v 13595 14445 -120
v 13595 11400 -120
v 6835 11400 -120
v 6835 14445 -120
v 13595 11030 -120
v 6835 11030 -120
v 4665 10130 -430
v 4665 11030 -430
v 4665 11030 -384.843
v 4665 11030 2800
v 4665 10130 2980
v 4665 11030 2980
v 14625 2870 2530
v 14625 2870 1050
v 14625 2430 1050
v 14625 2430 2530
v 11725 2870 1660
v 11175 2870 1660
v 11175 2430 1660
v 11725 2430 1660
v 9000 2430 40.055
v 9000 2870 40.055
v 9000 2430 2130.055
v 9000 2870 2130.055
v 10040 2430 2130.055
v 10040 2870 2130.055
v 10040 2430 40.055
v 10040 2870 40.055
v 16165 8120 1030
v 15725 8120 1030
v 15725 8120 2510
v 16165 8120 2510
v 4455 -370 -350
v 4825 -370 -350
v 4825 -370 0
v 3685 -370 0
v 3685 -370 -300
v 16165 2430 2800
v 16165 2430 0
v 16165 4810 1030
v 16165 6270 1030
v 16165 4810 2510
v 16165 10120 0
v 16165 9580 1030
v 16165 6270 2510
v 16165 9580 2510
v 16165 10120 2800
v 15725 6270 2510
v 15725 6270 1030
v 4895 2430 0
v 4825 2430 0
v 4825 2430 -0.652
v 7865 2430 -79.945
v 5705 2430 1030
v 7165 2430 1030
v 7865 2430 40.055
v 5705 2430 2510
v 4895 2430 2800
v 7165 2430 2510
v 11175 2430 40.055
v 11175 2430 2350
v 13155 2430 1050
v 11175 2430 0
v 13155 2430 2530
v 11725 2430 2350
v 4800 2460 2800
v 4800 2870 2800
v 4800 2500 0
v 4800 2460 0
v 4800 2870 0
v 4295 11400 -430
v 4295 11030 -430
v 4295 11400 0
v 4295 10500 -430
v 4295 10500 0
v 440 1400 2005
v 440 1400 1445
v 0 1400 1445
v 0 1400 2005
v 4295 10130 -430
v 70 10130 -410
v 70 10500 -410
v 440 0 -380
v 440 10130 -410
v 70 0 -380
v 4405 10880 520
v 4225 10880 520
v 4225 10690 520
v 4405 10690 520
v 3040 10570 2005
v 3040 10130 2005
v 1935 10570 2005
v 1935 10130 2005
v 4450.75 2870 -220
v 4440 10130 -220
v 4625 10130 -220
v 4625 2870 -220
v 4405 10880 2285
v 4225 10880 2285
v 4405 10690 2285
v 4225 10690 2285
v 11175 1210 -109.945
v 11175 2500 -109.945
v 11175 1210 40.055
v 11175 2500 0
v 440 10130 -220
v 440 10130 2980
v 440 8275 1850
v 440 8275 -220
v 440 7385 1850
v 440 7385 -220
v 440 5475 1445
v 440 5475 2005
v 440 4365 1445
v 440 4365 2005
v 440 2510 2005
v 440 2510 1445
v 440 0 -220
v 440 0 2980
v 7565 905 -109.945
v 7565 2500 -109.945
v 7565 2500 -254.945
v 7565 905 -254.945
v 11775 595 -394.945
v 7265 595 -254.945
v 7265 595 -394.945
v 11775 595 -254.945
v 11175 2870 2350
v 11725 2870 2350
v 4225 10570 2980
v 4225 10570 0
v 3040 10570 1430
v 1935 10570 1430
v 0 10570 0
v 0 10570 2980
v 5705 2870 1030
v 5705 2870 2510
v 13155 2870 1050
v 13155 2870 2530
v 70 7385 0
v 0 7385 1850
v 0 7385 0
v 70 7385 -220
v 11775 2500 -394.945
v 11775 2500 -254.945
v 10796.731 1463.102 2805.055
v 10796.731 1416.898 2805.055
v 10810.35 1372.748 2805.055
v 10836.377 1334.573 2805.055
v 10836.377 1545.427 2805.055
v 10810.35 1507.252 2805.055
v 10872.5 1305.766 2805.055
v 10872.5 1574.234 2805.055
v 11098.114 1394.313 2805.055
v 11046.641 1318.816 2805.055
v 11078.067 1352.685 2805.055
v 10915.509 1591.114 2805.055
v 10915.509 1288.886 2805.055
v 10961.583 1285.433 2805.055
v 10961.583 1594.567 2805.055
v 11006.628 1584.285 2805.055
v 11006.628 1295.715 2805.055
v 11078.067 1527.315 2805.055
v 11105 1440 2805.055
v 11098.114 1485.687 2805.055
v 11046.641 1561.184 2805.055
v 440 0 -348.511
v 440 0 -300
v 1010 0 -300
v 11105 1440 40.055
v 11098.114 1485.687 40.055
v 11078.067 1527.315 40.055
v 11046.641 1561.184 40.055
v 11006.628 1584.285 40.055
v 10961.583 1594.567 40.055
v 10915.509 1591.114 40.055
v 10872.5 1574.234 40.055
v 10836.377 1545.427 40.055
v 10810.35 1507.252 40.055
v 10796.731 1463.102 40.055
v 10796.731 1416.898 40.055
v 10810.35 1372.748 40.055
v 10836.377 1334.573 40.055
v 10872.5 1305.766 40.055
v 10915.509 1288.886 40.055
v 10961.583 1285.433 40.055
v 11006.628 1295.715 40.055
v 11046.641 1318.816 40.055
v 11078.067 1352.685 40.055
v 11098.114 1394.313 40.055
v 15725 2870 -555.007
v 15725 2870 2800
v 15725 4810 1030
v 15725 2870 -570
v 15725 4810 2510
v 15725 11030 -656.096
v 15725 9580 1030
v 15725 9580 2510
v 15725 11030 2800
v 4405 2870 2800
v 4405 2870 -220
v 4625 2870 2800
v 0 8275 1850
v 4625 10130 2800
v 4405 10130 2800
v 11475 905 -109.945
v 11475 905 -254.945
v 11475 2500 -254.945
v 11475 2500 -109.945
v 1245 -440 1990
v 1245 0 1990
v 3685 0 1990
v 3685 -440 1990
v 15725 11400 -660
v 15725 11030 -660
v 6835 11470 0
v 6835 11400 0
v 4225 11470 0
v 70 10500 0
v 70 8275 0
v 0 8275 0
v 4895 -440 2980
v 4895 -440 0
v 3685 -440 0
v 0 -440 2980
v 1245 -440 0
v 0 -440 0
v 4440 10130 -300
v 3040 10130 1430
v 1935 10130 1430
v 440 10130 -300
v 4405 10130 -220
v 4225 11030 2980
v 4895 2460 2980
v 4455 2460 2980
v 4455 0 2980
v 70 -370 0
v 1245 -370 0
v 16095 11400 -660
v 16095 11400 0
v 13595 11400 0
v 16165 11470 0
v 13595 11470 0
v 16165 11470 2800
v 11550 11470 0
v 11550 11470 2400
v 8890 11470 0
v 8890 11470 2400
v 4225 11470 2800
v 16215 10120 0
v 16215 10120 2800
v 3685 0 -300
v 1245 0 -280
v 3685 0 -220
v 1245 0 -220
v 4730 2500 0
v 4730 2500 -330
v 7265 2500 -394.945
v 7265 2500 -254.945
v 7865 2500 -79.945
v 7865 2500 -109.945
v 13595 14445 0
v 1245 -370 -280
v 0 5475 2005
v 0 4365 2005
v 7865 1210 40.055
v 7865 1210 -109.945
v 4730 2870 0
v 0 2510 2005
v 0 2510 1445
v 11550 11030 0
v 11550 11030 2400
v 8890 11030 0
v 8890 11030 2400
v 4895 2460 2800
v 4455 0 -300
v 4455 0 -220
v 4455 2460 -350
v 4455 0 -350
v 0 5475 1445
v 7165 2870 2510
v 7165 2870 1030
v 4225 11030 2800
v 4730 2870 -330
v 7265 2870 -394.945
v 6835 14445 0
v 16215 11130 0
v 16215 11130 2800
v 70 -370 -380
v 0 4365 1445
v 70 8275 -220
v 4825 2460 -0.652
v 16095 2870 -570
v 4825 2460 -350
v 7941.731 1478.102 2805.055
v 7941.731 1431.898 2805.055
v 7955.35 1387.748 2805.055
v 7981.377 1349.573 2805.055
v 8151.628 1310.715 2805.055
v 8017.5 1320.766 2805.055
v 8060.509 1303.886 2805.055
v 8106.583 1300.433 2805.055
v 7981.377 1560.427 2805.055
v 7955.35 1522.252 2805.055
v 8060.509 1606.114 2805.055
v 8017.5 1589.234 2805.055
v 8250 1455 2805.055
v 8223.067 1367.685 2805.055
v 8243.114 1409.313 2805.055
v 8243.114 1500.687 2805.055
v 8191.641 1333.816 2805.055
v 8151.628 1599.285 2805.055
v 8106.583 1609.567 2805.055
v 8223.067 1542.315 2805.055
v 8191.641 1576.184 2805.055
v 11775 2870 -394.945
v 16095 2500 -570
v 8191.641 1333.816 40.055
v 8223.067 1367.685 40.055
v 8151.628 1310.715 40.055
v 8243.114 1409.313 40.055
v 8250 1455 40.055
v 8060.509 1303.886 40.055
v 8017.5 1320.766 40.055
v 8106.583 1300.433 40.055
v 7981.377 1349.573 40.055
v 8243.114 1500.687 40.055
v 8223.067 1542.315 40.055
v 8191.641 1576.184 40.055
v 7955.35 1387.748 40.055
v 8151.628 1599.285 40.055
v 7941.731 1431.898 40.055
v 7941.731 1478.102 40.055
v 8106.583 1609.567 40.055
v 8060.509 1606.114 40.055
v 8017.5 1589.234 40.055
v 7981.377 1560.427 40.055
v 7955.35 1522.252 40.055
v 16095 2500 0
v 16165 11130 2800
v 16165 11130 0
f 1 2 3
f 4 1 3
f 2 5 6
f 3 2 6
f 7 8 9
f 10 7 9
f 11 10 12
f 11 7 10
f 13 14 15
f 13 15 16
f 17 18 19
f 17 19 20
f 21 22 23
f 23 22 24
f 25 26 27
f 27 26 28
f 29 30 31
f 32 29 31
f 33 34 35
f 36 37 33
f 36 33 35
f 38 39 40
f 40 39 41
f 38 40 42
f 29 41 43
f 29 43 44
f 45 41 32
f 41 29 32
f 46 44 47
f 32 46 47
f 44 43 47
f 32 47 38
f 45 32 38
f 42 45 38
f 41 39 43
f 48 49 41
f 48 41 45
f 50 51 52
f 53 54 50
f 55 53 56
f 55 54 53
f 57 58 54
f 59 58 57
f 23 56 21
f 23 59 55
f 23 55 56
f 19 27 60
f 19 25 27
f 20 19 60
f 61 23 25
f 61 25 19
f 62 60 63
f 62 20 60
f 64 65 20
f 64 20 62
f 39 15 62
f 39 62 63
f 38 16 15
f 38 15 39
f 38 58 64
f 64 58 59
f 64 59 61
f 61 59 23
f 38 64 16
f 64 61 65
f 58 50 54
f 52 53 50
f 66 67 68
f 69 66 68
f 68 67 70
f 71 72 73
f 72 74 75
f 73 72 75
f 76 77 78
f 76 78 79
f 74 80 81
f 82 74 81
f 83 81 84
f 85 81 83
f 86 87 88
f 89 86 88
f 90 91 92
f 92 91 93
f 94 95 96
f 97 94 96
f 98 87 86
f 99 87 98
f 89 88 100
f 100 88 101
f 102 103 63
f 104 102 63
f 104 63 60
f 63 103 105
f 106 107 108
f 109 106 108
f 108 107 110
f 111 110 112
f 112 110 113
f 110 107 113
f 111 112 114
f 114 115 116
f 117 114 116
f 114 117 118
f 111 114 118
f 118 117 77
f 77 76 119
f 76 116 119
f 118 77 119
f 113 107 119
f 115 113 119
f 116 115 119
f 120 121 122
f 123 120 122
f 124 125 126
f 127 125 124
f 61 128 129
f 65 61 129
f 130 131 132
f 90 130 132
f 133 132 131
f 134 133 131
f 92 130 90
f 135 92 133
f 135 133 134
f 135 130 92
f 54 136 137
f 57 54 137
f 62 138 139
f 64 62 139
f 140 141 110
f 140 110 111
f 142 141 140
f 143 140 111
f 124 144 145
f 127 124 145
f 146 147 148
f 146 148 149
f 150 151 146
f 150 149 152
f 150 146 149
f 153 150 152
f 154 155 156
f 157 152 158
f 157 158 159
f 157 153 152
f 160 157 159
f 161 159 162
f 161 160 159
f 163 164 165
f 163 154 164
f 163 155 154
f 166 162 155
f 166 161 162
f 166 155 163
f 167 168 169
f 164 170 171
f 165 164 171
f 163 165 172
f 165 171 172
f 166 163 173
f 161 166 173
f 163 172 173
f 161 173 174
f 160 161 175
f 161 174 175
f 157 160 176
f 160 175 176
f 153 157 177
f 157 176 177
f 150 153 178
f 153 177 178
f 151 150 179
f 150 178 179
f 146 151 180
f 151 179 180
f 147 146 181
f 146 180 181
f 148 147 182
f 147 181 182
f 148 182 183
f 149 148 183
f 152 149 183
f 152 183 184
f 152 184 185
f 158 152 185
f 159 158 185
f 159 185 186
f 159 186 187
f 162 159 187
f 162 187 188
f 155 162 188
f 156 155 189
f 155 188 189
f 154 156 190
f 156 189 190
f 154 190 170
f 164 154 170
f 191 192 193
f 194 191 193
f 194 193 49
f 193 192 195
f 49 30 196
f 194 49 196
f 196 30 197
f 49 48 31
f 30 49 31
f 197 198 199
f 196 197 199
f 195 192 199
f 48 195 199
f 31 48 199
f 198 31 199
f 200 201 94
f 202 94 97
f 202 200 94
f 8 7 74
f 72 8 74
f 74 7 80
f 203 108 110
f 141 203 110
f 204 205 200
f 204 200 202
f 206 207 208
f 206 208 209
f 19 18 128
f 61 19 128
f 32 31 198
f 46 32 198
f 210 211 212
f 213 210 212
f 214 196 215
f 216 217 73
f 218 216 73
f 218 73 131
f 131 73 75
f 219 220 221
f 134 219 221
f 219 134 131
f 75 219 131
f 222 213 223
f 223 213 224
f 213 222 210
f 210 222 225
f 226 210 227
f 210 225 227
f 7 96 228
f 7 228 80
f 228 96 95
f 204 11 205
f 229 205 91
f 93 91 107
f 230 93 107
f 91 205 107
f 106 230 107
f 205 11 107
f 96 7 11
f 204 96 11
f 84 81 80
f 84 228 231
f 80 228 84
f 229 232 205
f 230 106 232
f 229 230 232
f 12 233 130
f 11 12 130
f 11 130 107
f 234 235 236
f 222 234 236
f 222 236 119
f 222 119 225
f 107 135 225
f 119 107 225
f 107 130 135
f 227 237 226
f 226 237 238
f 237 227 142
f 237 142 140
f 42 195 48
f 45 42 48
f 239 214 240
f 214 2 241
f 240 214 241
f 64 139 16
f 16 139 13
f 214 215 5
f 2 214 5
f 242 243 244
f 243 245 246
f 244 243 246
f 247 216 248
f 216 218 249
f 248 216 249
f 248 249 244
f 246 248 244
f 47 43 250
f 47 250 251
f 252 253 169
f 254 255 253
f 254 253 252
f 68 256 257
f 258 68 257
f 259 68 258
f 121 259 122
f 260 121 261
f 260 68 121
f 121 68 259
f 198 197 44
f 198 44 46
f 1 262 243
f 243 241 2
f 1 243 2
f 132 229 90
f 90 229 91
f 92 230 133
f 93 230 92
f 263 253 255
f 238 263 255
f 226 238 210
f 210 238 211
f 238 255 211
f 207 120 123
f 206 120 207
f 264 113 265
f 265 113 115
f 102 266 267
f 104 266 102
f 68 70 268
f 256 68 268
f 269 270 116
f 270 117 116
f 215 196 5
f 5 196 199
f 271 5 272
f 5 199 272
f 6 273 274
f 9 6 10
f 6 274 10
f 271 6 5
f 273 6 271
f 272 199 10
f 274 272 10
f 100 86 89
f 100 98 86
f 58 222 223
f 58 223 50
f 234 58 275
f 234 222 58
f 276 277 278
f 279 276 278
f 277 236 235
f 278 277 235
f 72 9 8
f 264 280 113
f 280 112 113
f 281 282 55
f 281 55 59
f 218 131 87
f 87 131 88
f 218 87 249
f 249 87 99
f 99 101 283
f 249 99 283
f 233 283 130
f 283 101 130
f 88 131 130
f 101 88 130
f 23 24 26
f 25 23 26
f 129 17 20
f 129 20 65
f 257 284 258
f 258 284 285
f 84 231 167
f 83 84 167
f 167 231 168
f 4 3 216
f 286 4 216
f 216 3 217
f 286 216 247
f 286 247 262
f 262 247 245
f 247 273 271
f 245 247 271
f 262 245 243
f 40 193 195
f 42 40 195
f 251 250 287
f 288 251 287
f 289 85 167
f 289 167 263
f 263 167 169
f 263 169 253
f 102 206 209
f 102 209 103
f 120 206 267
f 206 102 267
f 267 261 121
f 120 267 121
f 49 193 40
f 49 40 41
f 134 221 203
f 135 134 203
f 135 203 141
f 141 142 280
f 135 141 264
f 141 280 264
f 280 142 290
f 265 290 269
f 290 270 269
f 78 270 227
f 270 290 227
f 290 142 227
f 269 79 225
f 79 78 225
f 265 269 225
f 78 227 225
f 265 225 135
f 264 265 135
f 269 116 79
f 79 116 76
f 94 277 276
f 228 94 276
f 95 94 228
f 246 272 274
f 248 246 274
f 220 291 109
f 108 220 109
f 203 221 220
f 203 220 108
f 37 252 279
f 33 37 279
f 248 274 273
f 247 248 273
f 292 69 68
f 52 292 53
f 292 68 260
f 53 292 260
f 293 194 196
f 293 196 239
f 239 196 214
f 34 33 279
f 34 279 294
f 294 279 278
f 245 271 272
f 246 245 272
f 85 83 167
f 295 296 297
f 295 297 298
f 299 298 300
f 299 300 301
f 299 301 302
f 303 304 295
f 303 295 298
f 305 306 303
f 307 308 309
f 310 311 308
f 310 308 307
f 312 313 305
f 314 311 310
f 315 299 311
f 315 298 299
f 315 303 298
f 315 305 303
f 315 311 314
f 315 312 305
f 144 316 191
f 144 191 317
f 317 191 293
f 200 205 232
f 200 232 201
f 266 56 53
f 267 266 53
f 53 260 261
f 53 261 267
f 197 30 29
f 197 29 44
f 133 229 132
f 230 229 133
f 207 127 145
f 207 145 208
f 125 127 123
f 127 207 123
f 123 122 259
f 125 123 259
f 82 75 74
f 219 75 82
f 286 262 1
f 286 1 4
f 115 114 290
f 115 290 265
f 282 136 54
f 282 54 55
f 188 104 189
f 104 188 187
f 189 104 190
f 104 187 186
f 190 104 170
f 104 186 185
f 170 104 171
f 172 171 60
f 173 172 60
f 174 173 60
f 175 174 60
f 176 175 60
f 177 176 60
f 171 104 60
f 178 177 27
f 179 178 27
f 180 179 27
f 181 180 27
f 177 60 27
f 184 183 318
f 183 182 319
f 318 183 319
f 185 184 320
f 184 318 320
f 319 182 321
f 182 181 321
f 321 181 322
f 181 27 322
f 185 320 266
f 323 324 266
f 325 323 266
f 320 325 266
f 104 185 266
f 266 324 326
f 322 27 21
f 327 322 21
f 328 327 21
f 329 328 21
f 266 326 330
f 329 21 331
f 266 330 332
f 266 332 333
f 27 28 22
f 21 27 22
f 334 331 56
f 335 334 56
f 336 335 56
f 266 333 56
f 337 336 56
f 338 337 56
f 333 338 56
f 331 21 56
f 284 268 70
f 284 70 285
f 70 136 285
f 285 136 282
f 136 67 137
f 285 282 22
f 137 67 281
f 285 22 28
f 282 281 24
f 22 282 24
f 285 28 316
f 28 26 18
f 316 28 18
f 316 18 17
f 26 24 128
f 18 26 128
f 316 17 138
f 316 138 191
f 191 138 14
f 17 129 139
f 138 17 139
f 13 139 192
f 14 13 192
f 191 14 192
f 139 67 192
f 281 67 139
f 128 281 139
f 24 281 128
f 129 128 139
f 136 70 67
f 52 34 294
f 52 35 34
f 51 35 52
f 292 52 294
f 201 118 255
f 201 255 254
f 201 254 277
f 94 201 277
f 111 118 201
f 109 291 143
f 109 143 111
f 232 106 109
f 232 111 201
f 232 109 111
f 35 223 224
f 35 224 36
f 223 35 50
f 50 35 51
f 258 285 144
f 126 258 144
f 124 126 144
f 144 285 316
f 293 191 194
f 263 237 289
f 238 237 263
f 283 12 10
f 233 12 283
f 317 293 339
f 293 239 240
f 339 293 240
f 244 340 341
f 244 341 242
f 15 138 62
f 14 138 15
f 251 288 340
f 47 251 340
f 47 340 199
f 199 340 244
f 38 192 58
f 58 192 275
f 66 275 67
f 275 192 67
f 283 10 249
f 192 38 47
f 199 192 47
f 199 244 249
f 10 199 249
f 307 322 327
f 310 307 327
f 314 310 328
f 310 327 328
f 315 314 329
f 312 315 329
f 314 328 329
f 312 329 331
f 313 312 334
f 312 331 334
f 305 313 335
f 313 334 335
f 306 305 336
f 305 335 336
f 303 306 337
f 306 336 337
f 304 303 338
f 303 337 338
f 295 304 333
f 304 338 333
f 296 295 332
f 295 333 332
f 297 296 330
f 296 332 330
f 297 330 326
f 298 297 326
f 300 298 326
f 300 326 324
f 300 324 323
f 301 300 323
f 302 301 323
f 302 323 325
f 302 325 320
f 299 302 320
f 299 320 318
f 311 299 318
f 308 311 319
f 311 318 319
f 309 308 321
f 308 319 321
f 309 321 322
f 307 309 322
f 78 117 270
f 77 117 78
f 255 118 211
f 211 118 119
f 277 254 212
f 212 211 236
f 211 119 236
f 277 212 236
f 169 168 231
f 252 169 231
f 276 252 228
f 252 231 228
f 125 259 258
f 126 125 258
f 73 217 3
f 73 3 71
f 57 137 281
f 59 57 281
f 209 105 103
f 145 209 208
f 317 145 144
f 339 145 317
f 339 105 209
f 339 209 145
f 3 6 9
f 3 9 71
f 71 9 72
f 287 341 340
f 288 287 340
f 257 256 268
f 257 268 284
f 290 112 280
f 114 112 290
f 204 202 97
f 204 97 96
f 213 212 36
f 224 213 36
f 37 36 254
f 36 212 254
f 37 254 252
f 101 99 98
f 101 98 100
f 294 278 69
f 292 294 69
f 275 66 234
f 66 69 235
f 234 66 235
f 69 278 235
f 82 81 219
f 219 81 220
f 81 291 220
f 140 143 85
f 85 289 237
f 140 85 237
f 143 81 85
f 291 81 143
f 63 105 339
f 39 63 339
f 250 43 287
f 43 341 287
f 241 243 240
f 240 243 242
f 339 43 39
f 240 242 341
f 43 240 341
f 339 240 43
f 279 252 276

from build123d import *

# Parameters (mm, degrees)
F1_DEPTH      = 440
F2_DEPTH      = 370
F3_W          = 1110
F3_H          = 560
F4_DEPTH      = 370
F4_DEPTH_BACK = 70
F5_DEPTH      = 370
F6_W          = 3785
F6_H          = 2980
F6_W_2        = 1105
F6_H_2        = 575
F7_DEPTH      = 440
F6_W_3        = 370
F6_H_3        = 410
F8_DEPTH      = 370
F9_DEPTH      = 900
F6_H_4        = 430
F10_DEPTH     = 900
F11_W         = 190
F11_H         = 1765
F12_DEPTH     = 400
F14_DEPTH     = 440
F15_DEPTH     = 370
F16_DEPTH     = 3415
F18_DEPTH     = 440
F17_W         = 7250
F17_H         = 2800
F17_W_2       = 1460
F17_H_2       = 1480
F17_W_3       = 910
F17_W_4       = 100
F19_DEPTH     = 490
F20_DEPTH     = 370
F21_W         = 1460
F21_H         = 1480
F21_W_2       = 1470
F21_W_3       = 550
F21_H_2       = 690
F22_DEPTH     = 440
F23_DEPTH     = 370
F24_DEPTH     = 2275
F25_DEPTH     = 1965
F26_DEPTH     = 1660
F27_R         = 155
F28_DEPTH     = 2765
F29_W         = 2460
F29_H         = 2980
F30_DEPTH     = 440
F29_H_2       = 350
F29_W_2       = 370
F31_DEPTH     = 370
F33_DEPTH     = 80
F34_W         = 220
F34_H         = 900
F34_H_2       = 7260
F35_DEPTH     = 3020


with BuildPart() as f1:
    # F0 (on Front) → F1 (new body)
    with BuildSketch(Plane.XZ):
        Polygon((0, 2980), (0, 0), (70, 0), (1245, 0), (1245, 1990), (3685, 1990), (3685, 0), (4455, 0), (4455, 2980), align=None)
    extrude(amount=F1_DEPTH)

    # F0 (on Front) → F2 (join)
    with BuildSketch(Plane.XZ):
        Polygon((1245, 0), (70, 0), (70, -380), (1245, -280), (1245, -180), align=None)
        Polygon((4455, -350), (4455, 0), (3685, 0), (3685, -180), (3685, -300), align=None)
    extrude(amount=F2_DEPTH)

    # F3 (on face) → F4 (join, two sides)
    with BuildSketch(Plane(origin=(70, 0, 0), x_dir=(0, -1, 0), z_dir=(-1, 0, 0))) as f4_sk:
        Polygon((440, 0), (440, 2980), (-10130, 2980), (-10130, 0), (-8275, 0), (-8275, 1850), (-7385, 1850), (-7385, 0), (0, 0), (370, 0), align=None)
        with Locations((-4920, 1725)):
            Rectangle(F3_W, F3_H, mode=Mode.SUBTRACT)
        with Locations((-1955, 1725)):
            Rectangle(F3_W, F3_H, mode=Mode.SUBTRACT)
    extrude(amount=-F4_DEPTH)
    extrude(f4_sk.sketch, amount=F4_DEPTH_BACK)

    # F3 (on face) → F5 (join)
    with BuildSketch(Plane(origin=(70, 0, 0), x_dir=(0, -1, 0), z_dir=(-1, 0, 0))):
        Polygon((-8275, 0), (-10130, 0), (-10130, -410), (0, -380), (0, 0), (-7385, 0), (-7385, -220), (-8275, -220), align=None)
    extrude(amount=-F5_DEPTH)

    # F6 (on face) → F7 (join)
    with BuildSketch(Plane(origin=(0, 10130, 0), x_dir=(-1, 0, 0), z_dir=(0, 1, 0))):
        Polygon((0, 0), (0, 2980), (-440, 2980), (-440, 0), (-70, 0), align=None)
        with Locations((-2332.5, 1490)):
            Rectangle(F6_W, F6_H)
        with Locations((-2487.5, 1717.5)):
            Rectangle(F6_W_2, F6_H_2, mode=Mode.SUBTRACT)
    extrude(amount=F7_DEPTH)

    # F6 (on face) → F8 (join)
    with BuildSketch(Plane(origin=(0, 10130, 0), x_dir=(-1, 0, 0), z_dir=(0, 1, 0))):
        Polygon((-440, -410), (-440, 0), (-4225, 0), (-4295, 0), (-4295, -430), (-70, -410), align=None)
        with Locations((-255, -205)):
            Rectangle(F6_W_3, F6_H_3)
    extrude(amount=F8_DEPTH)

    # F6 (on face) → F9 (join)
    with BuildSketch(Plane(origin=(0, 10130, 0), x_dir=(-1, 0, 0), z_dir=(0, 1, 0))):
        Polygon((-4225, 0), (-4225, 2980), (-4665, 2980), (-4665, 0), (-4295, 0), align=None)
    extrude(amount=F9_DEPTH)

    # F6 (on face) → F10 (join)
    with BuildSketch(Plane(origin=(0, 10130, 0), x_dir=(-1, 0, 0), z_dir=(0, 1, 0))):
        with Locations((-4480, -215)):
            Rectangle(F6_W_3, F6_H_4)
    extrude(amount=F10_DEPTH)

    # F11 (on face) → F12 (cut)
    with BuildSketch(Plane(origin=(4225, 0, 0), x_dir=(0, -1, 0), z_dir=(-1, 0, 0))):
        with Locations((-10785, 1402.5)):
            Rectangle(F11_W, F11_H)
    extrude(amount=-F12_DEPTH, mode=Mode.SUBTRACT)

    # F13 (on face) → F14 (join)
    with BuildSketch(Plane(origin=(0, 11030, 0), x_dir=(-1, 0, 0), z_dir=(0, 1, 0))):
        Polygon((-6835, 0), (-4665, 0), (-4665, 2800), (-15725, 2800), (-15725, 0), (-13595, 0), (-11550, 0), (-11550, 2400), (-8890, 2400), (-8890, 0), align=None)
        Polygon((-4295, 0), (-4225, 0), (-4225, 2800), (-4665, 2800), (-4665, 0), align=None)
    extrude(amount=F14_DEPTH)

    # F13 (on face) → F15 (join)
    with BuildSketch(Plane(origin=(0, 11030, 0), x_dir=(-1, 0, 0), z_dir=(0, 1, 0))):
        Polygon((-13595, 0), (-15725, 0), (-15725, -660), (-13595, -120), align=None)
        Polygon((-4665, -384.842519685), (-4665, 0), (-6835, 0), (-6835, -120), align=None)
        Polygon((-4295, -430), (-4295, 0), (-4665, 0), (-4665, -384.842519685), align=None)
    extrude(amount=F15_DEPTH)

    # F13 (on face) → F16 (join)
    with BuildSketch(Plane(origin=(0, 11030, 0), x_dir=(-1, 0, 0), z_dir=(0, 1, 0))):
        Polygon((-6835, -120), (-6835, 0), (-8890, 0), (-11550, 0), (-13595, 0), (-13595, -120), align=None)
    extrude(amount=F16_DEPTH)

    # F17 (on face) → F18 (join)
    with BuildSketch(Plane.YZ.offset(15725)):
        Polygon((11400, 0), (11470, 0), (11470, 2800), (11130, 2800), (11130, 0), align=None)
    extrude(amount=F18_DEPTH)



with BuildPart() as f18:
    # F17 (on face) → F18, piece 2 (new body)
    with BuildSketch(Plane.YZ.offset(15725)):
        with Locations((6495, 1400)):
            Rectangle(F17_W, F17_H)
        with Locations((5540, 1770)):
            Rectangle(F17_W_2, F17_H_2, mode=Mode.SUBTRACT)
        with Locations((8850, 1770)):
            Rectangle(F17_W_2, F17_H_2, mode=Mode.SUBTRACT)
    extrude(amount=F18_DEPTH)


with BuildPart() as f1_1:
    add(f1.part)

    add(f18.part)  # F19 merges F18
    # F17 (on face) → F19 (join)
    with BuildSketch(Plane.YZ.offset(15725)):
        with Locations((10575, 1400)):
            Rectangle(F17_W_3, F17_H)
        with Locations((11080, 1400)):
            Rectangle(F17_W_4, F17_H)
    extrude(amount=F19_DEPTH)

    # F17 (on face) → F20 (join)
    with BuildSketch(Plane.YZ.offset(15725)):
        Polygon((11030, -656.0961313013), (11030, 0), (10120, 0), (2870, 0), (2870, -570), align=None)
        Polygon((11400, -660), (11400, 0), (11130, 0), (11030, 0), (11030, -656.0961313013), align=None)
    extrude(amount=F20_DEPTH)

    # F21 (on face) → F22 (join)
    with BuildSketch(Plane.XZ.offset(-2870)):
        Polygon((15725, 0), (15725, 2800), (4800, 2800), (4800, 0), (7865, -79.944847658), (7865, 40.055152342), (9000, 40.055152342), (9000, 2130.055152342), (10040, 2130.055152342), (10040, 40.055152342), (11175, 40.055152342), (11175, 0), align=None)
        with Locations((6435, 1770)):
            Rectangle(F21_W, F21_H, mode=Mode.SUBTRACT)
        with Locations((13890, 1790)):
            Rectangle(F21_W_2, F21_H, mode=Mode.SUBTRACT)
        with Locations((11450, 2005)):
            Rectangle(F21_W_3, F21_H_2, mode=Mode.SUBTRACT)
        Polygon((16165, 0), (16165, 2800), (15725, 2800), (15725, 0), (16095, 0), align=None)
    extrude(amount=F22_DEPTH)

    # F21 (on face) → F23 (join)
    with BuildSketch(Plane.XZ.offset(-2870)):
        Polygon((15725, -555.0068503781), (15725, 0), (11175, 0), (11175, -109.944847658), (11475, -109.944847658), (11475, -254.944847658), (11775, -254.944847658), (11775, -394.944847658), align=None)
        Polygon((16095, 0), (15725, 0), (15725, -555.0068503781), (16095, -570), align=None)
        Polygon((7865, -79.944847658), (4800, 0), (4730, 0), (4730, -330), (7265, -394.944847658), (7265, -254.944847658), (7565, -254.944847658), (7565, -109.944847658), (7865, -109.944847658), align=None)
    extrude(amount=F23_DEPTH)

    # F21 (on face) → F24 (join)
    with BuildSketch(Plane.XZ.offset(-2870)):
        Polygon((7265, -394.944847658), (11775, -394.944847658), (11775, -254.944847658), (11475, -254.944847658), (7565, -254.944847658), (7265, -254.944847658), align=None)
    extrude(amount=F24_DEPTH)

    # F21 (on face) → F25 (join)
    with BuildSketch(Plane.XZ.offset(-2870)):
        Polygon((11475, -109.944847658), (11175, -109.944847658), (7865, -109.944847658), (7565, -109.944847658), (7565, -254.944847658), (11475, -254.944847658), align=None)
    extrude(amount=F25_DEPTH)

    # F21 (on face) → F26 (join)
    with BuildSketch(Plane.XZ.offset(-2870)):
        Polygon((11175, -109.944847658), (11175, 0), (11175, 40.055152342), (10040, 40.055152342), (9000, 40.055152342), (7865, 40.055152342), (7865, -79.944847658), (7865, -109.944847658), align=None)
    extrude(amount=F26_DEPTH)

    # F27 (on face) → F28 (join)
    with BuildSketch(Plane.XY.offset(40.055152342)):
        with Locations((8095, 1455)):
            Circle(F27_R)
        with Locations((10950, 1440)):
            Circle(F27_R)
    extrude(amount=F28_DEPTH)

    # F29 (on face) → F30 (join)
    with BuildSketch(Plane.YZ.offset(4455)):
        with Locations((1230, 1490)):
            Rectangle(F29_W, F29_H)
        Polygon((0, 0), (0, 2980), (-440, 2980), (-440, 0), (-370, 0), align=None)
    extrude(amount=F30_DEPTH)

    # F29 (on face) → F31 (join)
    with BuildSketch(Plane.YZ.offset(4455)):
        with Locations((1230, -175)):
            Rectangle(F29_W, F29_H_2)
        with Locations((-185, -175)):
            Rectangle(F29_W_2, F29_H_2)
    extrude(amount=F31_DEPTH)

    # F32 (on face) → F33 (join)
    with BuildSketch(Plane.XY.offset(-220)):
        Polygon((440, 10130), (440, 8275), (440, 7385), (440, 0), (4455, 0), (4440, 10130), align=None)
    extrude(amount=-F33_DEPTH)

    # F34 (on face) → F35 (join)
    with BuildSketch(Plane.XY.offset(2800)):
        with Locations((4515, 10580)):
            Rectangle(F34_W, F34_H)
        with Locations((4515, 6500)):
            Rectangle(F34_W, F34_H_2)
    extrude(amount=-F35_DEPTH)


solid = f1_1.part
